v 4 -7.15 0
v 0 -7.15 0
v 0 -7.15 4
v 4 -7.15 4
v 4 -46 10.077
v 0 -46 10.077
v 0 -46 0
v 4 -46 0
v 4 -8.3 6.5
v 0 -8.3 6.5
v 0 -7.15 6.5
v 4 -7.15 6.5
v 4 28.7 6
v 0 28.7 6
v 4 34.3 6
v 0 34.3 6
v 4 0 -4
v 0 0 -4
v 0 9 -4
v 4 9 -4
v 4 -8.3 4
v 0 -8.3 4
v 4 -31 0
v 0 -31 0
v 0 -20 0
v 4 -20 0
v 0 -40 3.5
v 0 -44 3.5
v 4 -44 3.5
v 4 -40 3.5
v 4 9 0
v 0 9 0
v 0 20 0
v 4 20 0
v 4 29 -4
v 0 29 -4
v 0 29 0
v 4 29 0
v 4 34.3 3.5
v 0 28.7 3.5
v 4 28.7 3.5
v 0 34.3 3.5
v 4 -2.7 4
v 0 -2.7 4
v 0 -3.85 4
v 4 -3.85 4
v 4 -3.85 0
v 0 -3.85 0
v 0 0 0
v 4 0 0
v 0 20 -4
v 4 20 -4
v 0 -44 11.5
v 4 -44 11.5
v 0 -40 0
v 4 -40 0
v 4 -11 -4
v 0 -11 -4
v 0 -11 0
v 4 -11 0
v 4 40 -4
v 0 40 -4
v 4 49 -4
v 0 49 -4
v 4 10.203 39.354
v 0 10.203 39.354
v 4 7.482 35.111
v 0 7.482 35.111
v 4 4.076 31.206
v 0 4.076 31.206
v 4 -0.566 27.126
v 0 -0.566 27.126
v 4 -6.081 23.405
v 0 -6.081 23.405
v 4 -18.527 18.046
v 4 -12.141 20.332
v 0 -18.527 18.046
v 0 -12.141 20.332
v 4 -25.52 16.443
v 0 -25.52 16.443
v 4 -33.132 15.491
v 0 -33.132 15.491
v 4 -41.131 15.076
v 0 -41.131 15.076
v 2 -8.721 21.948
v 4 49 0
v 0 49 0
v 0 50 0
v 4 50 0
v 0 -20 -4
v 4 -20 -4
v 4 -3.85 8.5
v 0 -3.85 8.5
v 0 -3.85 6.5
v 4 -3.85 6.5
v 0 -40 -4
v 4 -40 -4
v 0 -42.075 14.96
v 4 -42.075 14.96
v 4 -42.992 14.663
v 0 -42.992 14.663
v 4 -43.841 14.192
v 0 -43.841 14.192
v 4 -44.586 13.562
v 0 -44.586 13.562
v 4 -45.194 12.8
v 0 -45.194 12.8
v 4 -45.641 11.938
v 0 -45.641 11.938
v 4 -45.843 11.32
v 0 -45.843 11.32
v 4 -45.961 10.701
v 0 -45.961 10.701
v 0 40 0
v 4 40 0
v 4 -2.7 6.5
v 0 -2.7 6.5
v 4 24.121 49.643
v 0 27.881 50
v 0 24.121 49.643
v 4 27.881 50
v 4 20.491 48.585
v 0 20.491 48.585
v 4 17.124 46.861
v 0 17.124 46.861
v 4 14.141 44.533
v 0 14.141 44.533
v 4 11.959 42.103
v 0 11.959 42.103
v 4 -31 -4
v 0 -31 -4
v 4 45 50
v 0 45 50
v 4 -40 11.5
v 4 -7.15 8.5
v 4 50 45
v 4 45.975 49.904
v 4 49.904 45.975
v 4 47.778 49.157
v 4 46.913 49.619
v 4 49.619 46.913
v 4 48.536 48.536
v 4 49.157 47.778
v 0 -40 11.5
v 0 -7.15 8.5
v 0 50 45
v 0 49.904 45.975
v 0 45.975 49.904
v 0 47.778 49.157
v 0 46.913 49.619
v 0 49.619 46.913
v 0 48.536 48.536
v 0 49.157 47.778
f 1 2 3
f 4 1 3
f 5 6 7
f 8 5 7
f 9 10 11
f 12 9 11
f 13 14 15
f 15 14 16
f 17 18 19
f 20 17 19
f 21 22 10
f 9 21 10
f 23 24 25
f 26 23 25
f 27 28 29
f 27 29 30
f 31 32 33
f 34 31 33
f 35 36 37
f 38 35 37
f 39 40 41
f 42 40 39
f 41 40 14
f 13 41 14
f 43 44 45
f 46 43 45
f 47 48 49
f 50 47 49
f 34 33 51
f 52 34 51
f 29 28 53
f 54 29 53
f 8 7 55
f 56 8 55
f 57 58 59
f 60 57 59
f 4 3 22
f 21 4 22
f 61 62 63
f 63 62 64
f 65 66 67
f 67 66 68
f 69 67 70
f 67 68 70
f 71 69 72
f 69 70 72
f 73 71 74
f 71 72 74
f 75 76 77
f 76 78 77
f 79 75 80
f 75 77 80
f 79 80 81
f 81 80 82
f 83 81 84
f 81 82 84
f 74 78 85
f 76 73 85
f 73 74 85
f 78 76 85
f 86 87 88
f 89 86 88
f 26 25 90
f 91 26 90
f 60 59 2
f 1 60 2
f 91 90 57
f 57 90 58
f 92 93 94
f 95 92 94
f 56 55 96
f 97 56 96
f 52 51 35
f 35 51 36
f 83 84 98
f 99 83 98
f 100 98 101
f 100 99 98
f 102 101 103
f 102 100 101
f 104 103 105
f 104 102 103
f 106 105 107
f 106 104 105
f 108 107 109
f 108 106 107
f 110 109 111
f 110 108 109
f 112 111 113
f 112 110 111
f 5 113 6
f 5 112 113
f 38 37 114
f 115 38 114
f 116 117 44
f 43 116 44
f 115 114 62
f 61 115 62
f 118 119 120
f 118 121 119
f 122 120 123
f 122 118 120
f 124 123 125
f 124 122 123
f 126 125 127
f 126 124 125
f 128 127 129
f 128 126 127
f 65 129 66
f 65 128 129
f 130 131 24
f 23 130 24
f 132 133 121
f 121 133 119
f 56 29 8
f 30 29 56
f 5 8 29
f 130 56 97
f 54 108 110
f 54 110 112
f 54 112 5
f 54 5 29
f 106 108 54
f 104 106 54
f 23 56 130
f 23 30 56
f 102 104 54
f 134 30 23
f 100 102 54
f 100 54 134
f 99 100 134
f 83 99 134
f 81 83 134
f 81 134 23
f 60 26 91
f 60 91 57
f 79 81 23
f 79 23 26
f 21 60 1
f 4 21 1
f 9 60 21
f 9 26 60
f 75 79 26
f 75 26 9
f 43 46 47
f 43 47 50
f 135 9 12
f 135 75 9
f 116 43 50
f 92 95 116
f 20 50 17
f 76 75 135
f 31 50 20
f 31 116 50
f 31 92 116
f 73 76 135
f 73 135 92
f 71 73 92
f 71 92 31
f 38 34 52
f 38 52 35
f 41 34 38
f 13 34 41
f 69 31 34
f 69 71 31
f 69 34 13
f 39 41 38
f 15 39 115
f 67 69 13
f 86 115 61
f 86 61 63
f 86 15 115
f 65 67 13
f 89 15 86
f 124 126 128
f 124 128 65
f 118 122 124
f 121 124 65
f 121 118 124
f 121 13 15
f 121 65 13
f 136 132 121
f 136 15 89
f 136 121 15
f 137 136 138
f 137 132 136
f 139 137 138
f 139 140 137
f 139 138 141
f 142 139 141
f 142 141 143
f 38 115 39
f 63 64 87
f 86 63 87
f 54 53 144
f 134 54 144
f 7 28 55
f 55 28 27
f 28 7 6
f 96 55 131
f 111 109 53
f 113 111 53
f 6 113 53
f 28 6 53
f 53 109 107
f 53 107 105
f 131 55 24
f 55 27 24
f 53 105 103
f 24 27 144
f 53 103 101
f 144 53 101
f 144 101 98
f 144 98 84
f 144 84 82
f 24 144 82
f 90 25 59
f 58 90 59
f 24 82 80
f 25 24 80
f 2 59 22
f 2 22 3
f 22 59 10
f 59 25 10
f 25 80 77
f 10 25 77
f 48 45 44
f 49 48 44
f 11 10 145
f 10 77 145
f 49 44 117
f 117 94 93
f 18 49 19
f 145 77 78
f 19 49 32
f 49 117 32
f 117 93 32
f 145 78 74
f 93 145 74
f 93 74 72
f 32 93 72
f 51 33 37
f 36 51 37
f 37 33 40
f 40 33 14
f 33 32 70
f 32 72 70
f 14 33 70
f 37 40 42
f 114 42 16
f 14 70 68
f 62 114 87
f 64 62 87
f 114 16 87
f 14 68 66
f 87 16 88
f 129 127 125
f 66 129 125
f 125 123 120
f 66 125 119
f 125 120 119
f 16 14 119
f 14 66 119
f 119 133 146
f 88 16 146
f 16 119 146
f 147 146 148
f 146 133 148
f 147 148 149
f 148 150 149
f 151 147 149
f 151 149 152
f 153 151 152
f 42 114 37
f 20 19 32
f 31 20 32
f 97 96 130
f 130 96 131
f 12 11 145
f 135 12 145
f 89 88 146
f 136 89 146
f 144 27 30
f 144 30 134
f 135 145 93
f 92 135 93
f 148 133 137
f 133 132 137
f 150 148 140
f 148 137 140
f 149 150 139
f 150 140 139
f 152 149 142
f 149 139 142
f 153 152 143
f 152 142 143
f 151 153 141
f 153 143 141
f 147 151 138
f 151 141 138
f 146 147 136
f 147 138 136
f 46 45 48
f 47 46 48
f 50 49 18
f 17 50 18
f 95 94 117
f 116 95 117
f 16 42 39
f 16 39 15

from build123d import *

# Parameters (mm, degrees)
F0_W     = 4
F0_H     = 8
F0_W_2   = 5.6
F0_H_2   = 2.5
F1_DEPTH = 4
F2_R     = 20
F3_R     = 5


with BuildPart() as f1:
    # F0 (on Right) → F1 (new body)
    with BuildSketch(Plane.YZ):
        with BuildLine():
            Line((49, -4), (49, 0))
            Line((49, 0), (50, 0))
            Line((50, 0), (50, 50))
            Line((50, 50), (49, 50))
            Line((49, 50), (13, 50))
            add(Edge.make_bspline(
                [(13, 50), (12.9998758082, 38.0063697851), (-8.6775983117, 16.9623554105), (-32.0279580626, 15.0926403149), (-46, 15)],
                knots=[0, 0, 0, 0, 0.4916803973, 1, 1, 1, 1], degree=3))
            Line((-46, 15), (-46, 0))
            Line((-46, 0), (-40, 0))
            Line((-40, 0), (-40, -4))
            Line((-40, -4), (-31, -4))
            Line((-31, -4), (-31, 0))
            Line((-31, 0), (-20, 0))
            Line((-20, 0), (-20, -4))
            Line((-20, -4), (-11, -4))
            Line((-11, -4), (-11, 0))
            Line((-11, 0), (-7.15, 0))
            Line((-7.15, 0), (-7.15, 4))
            Line((-7.15, 4), (-8.3, 4))
            Line((-8.3, 4), (-8.3, 6.5))
            Line((-8.3, 6.5), (-7.15, 6.5))
            Line((-7.15, 6.5), (-7.15, 8.5))
            Line((-7.15, 8.5), (-5.5, 8.5))
            Line((-5.5, 8.5), (-3.85, 8.5))
            Line((-3.85, 8.5), (-3.85, 6.5))
            Line((-3.85, 6.5), (-2.7, 6.5))
            Line((-2.7, 6.5), (-2.7, 4))
            Line((-2.7, 4), (-3.85, 4))
            Line((-3.85, 4), (-3.85, 0))
            Line((-3.85, 0), (0, 0))
            Line((0, 0), (0, -4))
            Line((0, -4), (9, -4))
            Line((9, -4), (9, 0))
            Line((9, 0), (20, 0))
            Line((20, 0), (20, -4))
            Line((20, -4), (29, -4))
            Line((29, -4), (29, 0))
            Line((29, 0), (40, 0))
            Line((40, 0), (40, -4))
            Line((40, -4), (49, -4))
        make_face()
        with Locations((-42, 7.5)):
            Rectangle(F0_W, F0_H, mode=Mode.SUBTRACT)
        with Locations((31.5, 4.75)):
            Rectangle(F0_W_2, F0_H_2, mode=Mode.SUBTRACT)
    extrude(amount=F1_DEPTH)

    # F2
    f2_edges = [f1.edges().sort_by_distance(p)[0] for p in [
        (2, 13, 50),
    ]]
    fillet(f2_edges, radius=F2_R)

    # F3
    f3_edges = [f1.edges().sort_by_distance(p)[0] for p in [
        (2, 50, 50),
        (2, -46, 15),
    ]]
    fillet(f3_edges, radius=F3_R)


solid = f1.part
